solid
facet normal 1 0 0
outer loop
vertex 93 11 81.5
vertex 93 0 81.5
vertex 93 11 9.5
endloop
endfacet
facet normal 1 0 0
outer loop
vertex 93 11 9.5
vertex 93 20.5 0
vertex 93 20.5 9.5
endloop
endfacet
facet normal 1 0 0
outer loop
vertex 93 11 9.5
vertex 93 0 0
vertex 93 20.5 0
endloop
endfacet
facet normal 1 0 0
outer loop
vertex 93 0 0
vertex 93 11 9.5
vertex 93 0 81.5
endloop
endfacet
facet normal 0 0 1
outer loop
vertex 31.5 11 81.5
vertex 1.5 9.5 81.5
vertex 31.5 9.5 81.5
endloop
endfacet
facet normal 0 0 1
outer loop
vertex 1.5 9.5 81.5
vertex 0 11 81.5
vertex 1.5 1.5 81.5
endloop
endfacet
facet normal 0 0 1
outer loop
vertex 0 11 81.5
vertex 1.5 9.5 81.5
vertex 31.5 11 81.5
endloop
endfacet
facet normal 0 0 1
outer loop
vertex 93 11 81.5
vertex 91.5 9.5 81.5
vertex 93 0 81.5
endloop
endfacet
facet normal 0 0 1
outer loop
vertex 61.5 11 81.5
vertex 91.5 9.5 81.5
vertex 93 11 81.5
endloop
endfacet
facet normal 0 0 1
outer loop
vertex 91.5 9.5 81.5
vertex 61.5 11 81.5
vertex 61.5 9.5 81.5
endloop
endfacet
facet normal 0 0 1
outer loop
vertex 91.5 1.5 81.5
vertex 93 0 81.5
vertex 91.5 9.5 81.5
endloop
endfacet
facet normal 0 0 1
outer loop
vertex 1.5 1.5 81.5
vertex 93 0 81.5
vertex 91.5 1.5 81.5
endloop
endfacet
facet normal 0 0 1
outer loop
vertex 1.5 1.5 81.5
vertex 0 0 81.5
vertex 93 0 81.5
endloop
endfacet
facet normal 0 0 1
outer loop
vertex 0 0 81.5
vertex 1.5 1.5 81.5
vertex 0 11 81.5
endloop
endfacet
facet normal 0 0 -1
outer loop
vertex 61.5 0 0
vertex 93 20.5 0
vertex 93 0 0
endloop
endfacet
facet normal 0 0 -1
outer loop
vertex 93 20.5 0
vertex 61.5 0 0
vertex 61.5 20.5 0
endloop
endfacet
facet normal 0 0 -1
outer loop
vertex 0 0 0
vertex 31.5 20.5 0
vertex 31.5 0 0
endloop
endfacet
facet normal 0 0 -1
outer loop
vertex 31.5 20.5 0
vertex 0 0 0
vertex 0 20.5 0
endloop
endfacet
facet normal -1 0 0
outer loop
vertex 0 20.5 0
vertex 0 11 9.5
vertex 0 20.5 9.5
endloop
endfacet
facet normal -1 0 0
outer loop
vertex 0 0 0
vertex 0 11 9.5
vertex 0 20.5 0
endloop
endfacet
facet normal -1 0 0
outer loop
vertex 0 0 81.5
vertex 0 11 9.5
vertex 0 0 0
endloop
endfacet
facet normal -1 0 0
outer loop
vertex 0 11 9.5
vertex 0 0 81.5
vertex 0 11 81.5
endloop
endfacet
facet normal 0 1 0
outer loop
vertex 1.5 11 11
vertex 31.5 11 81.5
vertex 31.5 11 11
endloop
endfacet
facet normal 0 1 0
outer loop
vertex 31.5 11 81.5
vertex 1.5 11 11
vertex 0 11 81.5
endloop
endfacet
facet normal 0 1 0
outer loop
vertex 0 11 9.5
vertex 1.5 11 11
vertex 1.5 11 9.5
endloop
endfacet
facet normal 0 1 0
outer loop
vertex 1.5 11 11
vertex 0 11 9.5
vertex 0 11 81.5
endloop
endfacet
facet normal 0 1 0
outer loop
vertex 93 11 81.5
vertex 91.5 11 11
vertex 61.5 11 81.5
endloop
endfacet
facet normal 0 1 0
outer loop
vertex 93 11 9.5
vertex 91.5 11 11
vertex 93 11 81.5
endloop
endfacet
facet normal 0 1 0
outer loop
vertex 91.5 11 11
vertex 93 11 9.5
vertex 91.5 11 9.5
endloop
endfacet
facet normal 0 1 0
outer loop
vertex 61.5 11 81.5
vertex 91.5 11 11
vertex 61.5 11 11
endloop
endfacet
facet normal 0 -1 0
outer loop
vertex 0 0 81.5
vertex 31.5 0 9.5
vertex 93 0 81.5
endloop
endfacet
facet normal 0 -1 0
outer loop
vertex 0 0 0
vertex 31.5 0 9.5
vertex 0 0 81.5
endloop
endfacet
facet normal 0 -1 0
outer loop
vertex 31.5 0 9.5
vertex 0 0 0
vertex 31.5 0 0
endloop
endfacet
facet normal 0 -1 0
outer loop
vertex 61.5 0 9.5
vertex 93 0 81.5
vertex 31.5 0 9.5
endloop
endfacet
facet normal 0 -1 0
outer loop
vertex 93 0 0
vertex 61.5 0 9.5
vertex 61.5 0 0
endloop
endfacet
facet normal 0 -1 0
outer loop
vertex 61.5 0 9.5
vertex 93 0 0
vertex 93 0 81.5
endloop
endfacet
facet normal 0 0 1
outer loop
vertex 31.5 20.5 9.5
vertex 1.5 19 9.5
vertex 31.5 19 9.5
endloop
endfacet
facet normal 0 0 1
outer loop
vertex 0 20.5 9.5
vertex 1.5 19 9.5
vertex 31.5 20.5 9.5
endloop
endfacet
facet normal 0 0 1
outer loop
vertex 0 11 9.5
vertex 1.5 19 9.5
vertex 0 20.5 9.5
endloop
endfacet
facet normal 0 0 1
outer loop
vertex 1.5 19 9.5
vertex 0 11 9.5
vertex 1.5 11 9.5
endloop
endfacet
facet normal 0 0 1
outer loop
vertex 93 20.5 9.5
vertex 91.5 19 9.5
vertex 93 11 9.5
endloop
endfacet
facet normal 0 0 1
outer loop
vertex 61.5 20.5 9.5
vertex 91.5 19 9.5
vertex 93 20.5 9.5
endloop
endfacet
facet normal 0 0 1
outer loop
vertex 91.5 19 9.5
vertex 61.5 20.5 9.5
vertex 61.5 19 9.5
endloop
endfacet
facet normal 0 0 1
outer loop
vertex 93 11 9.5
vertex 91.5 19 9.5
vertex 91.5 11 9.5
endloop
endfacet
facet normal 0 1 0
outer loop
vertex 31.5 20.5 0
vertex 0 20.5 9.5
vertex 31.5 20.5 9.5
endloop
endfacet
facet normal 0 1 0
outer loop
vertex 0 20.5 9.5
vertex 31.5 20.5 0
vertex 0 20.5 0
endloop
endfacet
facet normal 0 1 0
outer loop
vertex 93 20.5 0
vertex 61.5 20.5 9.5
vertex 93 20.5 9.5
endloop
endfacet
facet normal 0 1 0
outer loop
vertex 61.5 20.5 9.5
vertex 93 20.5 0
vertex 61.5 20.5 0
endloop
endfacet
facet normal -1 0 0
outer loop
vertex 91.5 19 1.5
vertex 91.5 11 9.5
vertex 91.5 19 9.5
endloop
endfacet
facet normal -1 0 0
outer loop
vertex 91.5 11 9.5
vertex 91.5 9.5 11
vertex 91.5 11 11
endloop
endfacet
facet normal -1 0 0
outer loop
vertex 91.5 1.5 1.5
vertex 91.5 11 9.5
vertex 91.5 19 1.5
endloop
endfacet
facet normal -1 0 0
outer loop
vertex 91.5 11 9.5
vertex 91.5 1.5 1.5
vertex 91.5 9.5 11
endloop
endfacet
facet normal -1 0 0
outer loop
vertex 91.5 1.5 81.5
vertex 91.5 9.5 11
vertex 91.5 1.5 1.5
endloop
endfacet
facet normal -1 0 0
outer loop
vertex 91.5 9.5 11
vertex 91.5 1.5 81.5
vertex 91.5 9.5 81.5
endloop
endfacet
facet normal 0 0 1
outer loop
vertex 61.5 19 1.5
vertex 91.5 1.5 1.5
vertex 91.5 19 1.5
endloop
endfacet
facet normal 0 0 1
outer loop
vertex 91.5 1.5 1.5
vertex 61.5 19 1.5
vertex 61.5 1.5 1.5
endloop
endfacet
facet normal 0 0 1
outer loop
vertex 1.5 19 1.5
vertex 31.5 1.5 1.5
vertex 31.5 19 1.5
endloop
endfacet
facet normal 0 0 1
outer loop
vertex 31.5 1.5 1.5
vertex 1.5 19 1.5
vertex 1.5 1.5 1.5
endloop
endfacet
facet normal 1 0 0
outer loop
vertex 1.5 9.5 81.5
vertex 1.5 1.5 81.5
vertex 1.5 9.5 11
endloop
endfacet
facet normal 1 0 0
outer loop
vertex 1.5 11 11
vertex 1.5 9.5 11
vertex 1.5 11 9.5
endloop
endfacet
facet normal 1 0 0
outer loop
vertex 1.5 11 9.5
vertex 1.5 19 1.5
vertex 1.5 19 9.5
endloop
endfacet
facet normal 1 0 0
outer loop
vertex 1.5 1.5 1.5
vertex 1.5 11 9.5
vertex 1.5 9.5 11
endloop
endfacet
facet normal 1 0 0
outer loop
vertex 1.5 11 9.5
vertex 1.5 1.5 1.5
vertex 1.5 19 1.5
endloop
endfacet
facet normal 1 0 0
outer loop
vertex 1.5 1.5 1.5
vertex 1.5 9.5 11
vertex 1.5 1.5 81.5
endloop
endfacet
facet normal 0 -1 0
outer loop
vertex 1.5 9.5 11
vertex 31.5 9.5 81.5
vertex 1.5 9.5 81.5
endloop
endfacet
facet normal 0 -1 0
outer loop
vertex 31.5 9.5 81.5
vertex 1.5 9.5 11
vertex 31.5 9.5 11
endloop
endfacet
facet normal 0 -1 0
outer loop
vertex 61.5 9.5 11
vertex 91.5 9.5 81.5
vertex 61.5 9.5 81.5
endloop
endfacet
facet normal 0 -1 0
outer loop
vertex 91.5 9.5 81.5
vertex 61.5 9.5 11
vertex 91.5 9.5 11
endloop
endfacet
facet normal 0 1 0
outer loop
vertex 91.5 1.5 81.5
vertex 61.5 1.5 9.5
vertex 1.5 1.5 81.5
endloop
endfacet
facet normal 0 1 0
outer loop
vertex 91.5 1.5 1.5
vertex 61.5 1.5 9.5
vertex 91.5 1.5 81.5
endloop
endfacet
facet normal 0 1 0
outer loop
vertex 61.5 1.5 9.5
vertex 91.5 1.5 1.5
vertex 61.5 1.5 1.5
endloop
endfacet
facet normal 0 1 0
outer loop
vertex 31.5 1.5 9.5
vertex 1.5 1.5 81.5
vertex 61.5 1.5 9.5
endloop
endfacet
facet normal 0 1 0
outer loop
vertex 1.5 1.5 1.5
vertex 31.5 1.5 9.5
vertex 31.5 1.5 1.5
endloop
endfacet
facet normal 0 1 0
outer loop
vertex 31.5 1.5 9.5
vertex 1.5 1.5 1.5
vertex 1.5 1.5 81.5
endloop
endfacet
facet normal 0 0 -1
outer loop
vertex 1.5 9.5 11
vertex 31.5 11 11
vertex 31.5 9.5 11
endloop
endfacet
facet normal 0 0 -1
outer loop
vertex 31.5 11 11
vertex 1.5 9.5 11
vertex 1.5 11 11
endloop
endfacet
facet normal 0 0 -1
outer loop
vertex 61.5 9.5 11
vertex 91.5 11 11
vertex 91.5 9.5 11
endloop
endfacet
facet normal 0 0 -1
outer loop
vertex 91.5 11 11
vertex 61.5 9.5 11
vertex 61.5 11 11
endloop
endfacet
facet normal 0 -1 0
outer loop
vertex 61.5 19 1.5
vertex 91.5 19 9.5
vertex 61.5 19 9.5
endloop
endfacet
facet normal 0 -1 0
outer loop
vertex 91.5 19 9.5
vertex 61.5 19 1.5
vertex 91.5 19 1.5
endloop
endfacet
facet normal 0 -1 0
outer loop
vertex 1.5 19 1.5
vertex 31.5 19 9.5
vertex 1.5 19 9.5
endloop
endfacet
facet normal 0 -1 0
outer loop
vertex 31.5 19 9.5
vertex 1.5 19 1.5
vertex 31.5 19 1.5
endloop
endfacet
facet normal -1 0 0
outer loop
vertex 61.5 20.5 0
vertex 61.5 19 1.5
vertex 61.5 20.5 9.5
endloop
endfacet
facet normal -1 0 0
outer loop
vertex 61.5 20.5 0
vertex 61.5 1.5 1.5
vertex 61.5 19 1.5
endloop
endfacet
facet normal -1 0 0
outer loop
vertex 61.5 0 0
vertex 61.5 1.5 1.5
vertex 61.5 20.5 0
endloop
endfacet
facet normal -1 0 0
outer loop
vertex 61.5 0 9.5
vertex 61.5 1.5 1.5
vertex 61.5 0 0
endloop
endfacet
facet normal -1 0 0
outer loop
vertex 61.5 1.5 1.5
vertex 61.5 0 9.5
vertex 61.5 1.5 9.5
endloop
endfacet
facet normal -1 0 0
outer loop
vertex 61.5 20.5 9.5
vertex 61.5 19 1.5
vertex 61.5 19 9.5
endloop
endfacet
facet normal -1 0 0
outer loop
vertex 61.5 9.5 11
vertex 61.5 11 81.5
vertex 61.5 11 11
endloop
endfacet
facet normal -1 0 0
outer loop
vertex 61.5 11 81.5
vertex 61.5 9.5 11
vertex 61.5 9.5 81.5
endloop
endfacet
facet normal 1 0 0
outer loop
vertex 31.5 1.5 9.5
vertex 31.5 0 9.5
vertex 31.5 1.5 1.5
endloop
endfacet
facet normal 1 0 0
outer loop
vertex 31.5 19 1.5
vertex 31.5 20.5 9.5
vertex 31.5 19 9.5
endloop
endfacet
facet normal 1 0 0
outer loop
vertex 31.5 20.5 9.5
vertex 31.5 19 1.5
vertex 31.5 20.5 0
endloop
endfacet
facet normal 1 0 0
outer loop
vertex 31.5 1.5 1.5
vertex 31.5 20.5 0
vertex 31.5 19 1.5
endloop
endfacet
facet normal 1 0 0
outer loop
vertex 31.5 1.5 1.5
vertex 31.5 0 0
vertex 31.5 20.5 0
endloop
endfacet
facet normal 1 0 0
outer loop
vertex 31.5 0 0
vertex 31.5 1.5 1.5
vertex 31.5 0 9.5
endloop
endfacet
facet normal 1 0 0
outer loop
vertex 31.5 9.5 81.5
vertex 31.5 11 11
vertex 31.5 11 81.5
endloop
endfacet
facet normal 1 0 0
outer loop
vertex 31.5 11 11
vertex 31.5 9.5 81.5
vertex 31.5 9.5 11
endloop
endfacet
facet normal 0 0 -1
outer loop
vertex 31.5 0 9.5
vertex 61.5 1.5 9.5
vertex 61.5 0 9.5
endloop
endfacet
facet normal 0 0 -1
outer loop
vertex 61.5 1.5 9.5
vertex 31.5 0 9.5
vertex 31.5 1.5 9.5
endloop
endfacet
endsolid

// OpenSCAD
length = 90;
dia = 8;
number = 10; // how many pencils to hold

finger = 30; //

wall = 1.5; // wall thickness

difference() {
    union() {
        // main corpus
        cube([length + wall*2, dia + wall*2, dia*number + wall]);
        
        // tray
        translate([0, dia + wall, 0])
            cube([length + wall*2, dia + wall*2, dia + wall]);
    }
    
    // inner corpus
    translate([wall, wall, wall])
        cube([length, dia, dia*number]);
    
    // inner tray
    translate([wall, dia+wall, wall])
        cube([length, dia+wall, dia+wall]);
    
    // view/finger hole
    translate([((length  + wall*2)-finger)/2 ,wall,0])
        cube([finger, dia*2+wall*2, dia*number + wall]);
    
    // finger hole in the back
    translate([((length  + wall*2)-finger)/2 ,0 ,0])
        cube([finger, wall*2, dia + wall]);
}
